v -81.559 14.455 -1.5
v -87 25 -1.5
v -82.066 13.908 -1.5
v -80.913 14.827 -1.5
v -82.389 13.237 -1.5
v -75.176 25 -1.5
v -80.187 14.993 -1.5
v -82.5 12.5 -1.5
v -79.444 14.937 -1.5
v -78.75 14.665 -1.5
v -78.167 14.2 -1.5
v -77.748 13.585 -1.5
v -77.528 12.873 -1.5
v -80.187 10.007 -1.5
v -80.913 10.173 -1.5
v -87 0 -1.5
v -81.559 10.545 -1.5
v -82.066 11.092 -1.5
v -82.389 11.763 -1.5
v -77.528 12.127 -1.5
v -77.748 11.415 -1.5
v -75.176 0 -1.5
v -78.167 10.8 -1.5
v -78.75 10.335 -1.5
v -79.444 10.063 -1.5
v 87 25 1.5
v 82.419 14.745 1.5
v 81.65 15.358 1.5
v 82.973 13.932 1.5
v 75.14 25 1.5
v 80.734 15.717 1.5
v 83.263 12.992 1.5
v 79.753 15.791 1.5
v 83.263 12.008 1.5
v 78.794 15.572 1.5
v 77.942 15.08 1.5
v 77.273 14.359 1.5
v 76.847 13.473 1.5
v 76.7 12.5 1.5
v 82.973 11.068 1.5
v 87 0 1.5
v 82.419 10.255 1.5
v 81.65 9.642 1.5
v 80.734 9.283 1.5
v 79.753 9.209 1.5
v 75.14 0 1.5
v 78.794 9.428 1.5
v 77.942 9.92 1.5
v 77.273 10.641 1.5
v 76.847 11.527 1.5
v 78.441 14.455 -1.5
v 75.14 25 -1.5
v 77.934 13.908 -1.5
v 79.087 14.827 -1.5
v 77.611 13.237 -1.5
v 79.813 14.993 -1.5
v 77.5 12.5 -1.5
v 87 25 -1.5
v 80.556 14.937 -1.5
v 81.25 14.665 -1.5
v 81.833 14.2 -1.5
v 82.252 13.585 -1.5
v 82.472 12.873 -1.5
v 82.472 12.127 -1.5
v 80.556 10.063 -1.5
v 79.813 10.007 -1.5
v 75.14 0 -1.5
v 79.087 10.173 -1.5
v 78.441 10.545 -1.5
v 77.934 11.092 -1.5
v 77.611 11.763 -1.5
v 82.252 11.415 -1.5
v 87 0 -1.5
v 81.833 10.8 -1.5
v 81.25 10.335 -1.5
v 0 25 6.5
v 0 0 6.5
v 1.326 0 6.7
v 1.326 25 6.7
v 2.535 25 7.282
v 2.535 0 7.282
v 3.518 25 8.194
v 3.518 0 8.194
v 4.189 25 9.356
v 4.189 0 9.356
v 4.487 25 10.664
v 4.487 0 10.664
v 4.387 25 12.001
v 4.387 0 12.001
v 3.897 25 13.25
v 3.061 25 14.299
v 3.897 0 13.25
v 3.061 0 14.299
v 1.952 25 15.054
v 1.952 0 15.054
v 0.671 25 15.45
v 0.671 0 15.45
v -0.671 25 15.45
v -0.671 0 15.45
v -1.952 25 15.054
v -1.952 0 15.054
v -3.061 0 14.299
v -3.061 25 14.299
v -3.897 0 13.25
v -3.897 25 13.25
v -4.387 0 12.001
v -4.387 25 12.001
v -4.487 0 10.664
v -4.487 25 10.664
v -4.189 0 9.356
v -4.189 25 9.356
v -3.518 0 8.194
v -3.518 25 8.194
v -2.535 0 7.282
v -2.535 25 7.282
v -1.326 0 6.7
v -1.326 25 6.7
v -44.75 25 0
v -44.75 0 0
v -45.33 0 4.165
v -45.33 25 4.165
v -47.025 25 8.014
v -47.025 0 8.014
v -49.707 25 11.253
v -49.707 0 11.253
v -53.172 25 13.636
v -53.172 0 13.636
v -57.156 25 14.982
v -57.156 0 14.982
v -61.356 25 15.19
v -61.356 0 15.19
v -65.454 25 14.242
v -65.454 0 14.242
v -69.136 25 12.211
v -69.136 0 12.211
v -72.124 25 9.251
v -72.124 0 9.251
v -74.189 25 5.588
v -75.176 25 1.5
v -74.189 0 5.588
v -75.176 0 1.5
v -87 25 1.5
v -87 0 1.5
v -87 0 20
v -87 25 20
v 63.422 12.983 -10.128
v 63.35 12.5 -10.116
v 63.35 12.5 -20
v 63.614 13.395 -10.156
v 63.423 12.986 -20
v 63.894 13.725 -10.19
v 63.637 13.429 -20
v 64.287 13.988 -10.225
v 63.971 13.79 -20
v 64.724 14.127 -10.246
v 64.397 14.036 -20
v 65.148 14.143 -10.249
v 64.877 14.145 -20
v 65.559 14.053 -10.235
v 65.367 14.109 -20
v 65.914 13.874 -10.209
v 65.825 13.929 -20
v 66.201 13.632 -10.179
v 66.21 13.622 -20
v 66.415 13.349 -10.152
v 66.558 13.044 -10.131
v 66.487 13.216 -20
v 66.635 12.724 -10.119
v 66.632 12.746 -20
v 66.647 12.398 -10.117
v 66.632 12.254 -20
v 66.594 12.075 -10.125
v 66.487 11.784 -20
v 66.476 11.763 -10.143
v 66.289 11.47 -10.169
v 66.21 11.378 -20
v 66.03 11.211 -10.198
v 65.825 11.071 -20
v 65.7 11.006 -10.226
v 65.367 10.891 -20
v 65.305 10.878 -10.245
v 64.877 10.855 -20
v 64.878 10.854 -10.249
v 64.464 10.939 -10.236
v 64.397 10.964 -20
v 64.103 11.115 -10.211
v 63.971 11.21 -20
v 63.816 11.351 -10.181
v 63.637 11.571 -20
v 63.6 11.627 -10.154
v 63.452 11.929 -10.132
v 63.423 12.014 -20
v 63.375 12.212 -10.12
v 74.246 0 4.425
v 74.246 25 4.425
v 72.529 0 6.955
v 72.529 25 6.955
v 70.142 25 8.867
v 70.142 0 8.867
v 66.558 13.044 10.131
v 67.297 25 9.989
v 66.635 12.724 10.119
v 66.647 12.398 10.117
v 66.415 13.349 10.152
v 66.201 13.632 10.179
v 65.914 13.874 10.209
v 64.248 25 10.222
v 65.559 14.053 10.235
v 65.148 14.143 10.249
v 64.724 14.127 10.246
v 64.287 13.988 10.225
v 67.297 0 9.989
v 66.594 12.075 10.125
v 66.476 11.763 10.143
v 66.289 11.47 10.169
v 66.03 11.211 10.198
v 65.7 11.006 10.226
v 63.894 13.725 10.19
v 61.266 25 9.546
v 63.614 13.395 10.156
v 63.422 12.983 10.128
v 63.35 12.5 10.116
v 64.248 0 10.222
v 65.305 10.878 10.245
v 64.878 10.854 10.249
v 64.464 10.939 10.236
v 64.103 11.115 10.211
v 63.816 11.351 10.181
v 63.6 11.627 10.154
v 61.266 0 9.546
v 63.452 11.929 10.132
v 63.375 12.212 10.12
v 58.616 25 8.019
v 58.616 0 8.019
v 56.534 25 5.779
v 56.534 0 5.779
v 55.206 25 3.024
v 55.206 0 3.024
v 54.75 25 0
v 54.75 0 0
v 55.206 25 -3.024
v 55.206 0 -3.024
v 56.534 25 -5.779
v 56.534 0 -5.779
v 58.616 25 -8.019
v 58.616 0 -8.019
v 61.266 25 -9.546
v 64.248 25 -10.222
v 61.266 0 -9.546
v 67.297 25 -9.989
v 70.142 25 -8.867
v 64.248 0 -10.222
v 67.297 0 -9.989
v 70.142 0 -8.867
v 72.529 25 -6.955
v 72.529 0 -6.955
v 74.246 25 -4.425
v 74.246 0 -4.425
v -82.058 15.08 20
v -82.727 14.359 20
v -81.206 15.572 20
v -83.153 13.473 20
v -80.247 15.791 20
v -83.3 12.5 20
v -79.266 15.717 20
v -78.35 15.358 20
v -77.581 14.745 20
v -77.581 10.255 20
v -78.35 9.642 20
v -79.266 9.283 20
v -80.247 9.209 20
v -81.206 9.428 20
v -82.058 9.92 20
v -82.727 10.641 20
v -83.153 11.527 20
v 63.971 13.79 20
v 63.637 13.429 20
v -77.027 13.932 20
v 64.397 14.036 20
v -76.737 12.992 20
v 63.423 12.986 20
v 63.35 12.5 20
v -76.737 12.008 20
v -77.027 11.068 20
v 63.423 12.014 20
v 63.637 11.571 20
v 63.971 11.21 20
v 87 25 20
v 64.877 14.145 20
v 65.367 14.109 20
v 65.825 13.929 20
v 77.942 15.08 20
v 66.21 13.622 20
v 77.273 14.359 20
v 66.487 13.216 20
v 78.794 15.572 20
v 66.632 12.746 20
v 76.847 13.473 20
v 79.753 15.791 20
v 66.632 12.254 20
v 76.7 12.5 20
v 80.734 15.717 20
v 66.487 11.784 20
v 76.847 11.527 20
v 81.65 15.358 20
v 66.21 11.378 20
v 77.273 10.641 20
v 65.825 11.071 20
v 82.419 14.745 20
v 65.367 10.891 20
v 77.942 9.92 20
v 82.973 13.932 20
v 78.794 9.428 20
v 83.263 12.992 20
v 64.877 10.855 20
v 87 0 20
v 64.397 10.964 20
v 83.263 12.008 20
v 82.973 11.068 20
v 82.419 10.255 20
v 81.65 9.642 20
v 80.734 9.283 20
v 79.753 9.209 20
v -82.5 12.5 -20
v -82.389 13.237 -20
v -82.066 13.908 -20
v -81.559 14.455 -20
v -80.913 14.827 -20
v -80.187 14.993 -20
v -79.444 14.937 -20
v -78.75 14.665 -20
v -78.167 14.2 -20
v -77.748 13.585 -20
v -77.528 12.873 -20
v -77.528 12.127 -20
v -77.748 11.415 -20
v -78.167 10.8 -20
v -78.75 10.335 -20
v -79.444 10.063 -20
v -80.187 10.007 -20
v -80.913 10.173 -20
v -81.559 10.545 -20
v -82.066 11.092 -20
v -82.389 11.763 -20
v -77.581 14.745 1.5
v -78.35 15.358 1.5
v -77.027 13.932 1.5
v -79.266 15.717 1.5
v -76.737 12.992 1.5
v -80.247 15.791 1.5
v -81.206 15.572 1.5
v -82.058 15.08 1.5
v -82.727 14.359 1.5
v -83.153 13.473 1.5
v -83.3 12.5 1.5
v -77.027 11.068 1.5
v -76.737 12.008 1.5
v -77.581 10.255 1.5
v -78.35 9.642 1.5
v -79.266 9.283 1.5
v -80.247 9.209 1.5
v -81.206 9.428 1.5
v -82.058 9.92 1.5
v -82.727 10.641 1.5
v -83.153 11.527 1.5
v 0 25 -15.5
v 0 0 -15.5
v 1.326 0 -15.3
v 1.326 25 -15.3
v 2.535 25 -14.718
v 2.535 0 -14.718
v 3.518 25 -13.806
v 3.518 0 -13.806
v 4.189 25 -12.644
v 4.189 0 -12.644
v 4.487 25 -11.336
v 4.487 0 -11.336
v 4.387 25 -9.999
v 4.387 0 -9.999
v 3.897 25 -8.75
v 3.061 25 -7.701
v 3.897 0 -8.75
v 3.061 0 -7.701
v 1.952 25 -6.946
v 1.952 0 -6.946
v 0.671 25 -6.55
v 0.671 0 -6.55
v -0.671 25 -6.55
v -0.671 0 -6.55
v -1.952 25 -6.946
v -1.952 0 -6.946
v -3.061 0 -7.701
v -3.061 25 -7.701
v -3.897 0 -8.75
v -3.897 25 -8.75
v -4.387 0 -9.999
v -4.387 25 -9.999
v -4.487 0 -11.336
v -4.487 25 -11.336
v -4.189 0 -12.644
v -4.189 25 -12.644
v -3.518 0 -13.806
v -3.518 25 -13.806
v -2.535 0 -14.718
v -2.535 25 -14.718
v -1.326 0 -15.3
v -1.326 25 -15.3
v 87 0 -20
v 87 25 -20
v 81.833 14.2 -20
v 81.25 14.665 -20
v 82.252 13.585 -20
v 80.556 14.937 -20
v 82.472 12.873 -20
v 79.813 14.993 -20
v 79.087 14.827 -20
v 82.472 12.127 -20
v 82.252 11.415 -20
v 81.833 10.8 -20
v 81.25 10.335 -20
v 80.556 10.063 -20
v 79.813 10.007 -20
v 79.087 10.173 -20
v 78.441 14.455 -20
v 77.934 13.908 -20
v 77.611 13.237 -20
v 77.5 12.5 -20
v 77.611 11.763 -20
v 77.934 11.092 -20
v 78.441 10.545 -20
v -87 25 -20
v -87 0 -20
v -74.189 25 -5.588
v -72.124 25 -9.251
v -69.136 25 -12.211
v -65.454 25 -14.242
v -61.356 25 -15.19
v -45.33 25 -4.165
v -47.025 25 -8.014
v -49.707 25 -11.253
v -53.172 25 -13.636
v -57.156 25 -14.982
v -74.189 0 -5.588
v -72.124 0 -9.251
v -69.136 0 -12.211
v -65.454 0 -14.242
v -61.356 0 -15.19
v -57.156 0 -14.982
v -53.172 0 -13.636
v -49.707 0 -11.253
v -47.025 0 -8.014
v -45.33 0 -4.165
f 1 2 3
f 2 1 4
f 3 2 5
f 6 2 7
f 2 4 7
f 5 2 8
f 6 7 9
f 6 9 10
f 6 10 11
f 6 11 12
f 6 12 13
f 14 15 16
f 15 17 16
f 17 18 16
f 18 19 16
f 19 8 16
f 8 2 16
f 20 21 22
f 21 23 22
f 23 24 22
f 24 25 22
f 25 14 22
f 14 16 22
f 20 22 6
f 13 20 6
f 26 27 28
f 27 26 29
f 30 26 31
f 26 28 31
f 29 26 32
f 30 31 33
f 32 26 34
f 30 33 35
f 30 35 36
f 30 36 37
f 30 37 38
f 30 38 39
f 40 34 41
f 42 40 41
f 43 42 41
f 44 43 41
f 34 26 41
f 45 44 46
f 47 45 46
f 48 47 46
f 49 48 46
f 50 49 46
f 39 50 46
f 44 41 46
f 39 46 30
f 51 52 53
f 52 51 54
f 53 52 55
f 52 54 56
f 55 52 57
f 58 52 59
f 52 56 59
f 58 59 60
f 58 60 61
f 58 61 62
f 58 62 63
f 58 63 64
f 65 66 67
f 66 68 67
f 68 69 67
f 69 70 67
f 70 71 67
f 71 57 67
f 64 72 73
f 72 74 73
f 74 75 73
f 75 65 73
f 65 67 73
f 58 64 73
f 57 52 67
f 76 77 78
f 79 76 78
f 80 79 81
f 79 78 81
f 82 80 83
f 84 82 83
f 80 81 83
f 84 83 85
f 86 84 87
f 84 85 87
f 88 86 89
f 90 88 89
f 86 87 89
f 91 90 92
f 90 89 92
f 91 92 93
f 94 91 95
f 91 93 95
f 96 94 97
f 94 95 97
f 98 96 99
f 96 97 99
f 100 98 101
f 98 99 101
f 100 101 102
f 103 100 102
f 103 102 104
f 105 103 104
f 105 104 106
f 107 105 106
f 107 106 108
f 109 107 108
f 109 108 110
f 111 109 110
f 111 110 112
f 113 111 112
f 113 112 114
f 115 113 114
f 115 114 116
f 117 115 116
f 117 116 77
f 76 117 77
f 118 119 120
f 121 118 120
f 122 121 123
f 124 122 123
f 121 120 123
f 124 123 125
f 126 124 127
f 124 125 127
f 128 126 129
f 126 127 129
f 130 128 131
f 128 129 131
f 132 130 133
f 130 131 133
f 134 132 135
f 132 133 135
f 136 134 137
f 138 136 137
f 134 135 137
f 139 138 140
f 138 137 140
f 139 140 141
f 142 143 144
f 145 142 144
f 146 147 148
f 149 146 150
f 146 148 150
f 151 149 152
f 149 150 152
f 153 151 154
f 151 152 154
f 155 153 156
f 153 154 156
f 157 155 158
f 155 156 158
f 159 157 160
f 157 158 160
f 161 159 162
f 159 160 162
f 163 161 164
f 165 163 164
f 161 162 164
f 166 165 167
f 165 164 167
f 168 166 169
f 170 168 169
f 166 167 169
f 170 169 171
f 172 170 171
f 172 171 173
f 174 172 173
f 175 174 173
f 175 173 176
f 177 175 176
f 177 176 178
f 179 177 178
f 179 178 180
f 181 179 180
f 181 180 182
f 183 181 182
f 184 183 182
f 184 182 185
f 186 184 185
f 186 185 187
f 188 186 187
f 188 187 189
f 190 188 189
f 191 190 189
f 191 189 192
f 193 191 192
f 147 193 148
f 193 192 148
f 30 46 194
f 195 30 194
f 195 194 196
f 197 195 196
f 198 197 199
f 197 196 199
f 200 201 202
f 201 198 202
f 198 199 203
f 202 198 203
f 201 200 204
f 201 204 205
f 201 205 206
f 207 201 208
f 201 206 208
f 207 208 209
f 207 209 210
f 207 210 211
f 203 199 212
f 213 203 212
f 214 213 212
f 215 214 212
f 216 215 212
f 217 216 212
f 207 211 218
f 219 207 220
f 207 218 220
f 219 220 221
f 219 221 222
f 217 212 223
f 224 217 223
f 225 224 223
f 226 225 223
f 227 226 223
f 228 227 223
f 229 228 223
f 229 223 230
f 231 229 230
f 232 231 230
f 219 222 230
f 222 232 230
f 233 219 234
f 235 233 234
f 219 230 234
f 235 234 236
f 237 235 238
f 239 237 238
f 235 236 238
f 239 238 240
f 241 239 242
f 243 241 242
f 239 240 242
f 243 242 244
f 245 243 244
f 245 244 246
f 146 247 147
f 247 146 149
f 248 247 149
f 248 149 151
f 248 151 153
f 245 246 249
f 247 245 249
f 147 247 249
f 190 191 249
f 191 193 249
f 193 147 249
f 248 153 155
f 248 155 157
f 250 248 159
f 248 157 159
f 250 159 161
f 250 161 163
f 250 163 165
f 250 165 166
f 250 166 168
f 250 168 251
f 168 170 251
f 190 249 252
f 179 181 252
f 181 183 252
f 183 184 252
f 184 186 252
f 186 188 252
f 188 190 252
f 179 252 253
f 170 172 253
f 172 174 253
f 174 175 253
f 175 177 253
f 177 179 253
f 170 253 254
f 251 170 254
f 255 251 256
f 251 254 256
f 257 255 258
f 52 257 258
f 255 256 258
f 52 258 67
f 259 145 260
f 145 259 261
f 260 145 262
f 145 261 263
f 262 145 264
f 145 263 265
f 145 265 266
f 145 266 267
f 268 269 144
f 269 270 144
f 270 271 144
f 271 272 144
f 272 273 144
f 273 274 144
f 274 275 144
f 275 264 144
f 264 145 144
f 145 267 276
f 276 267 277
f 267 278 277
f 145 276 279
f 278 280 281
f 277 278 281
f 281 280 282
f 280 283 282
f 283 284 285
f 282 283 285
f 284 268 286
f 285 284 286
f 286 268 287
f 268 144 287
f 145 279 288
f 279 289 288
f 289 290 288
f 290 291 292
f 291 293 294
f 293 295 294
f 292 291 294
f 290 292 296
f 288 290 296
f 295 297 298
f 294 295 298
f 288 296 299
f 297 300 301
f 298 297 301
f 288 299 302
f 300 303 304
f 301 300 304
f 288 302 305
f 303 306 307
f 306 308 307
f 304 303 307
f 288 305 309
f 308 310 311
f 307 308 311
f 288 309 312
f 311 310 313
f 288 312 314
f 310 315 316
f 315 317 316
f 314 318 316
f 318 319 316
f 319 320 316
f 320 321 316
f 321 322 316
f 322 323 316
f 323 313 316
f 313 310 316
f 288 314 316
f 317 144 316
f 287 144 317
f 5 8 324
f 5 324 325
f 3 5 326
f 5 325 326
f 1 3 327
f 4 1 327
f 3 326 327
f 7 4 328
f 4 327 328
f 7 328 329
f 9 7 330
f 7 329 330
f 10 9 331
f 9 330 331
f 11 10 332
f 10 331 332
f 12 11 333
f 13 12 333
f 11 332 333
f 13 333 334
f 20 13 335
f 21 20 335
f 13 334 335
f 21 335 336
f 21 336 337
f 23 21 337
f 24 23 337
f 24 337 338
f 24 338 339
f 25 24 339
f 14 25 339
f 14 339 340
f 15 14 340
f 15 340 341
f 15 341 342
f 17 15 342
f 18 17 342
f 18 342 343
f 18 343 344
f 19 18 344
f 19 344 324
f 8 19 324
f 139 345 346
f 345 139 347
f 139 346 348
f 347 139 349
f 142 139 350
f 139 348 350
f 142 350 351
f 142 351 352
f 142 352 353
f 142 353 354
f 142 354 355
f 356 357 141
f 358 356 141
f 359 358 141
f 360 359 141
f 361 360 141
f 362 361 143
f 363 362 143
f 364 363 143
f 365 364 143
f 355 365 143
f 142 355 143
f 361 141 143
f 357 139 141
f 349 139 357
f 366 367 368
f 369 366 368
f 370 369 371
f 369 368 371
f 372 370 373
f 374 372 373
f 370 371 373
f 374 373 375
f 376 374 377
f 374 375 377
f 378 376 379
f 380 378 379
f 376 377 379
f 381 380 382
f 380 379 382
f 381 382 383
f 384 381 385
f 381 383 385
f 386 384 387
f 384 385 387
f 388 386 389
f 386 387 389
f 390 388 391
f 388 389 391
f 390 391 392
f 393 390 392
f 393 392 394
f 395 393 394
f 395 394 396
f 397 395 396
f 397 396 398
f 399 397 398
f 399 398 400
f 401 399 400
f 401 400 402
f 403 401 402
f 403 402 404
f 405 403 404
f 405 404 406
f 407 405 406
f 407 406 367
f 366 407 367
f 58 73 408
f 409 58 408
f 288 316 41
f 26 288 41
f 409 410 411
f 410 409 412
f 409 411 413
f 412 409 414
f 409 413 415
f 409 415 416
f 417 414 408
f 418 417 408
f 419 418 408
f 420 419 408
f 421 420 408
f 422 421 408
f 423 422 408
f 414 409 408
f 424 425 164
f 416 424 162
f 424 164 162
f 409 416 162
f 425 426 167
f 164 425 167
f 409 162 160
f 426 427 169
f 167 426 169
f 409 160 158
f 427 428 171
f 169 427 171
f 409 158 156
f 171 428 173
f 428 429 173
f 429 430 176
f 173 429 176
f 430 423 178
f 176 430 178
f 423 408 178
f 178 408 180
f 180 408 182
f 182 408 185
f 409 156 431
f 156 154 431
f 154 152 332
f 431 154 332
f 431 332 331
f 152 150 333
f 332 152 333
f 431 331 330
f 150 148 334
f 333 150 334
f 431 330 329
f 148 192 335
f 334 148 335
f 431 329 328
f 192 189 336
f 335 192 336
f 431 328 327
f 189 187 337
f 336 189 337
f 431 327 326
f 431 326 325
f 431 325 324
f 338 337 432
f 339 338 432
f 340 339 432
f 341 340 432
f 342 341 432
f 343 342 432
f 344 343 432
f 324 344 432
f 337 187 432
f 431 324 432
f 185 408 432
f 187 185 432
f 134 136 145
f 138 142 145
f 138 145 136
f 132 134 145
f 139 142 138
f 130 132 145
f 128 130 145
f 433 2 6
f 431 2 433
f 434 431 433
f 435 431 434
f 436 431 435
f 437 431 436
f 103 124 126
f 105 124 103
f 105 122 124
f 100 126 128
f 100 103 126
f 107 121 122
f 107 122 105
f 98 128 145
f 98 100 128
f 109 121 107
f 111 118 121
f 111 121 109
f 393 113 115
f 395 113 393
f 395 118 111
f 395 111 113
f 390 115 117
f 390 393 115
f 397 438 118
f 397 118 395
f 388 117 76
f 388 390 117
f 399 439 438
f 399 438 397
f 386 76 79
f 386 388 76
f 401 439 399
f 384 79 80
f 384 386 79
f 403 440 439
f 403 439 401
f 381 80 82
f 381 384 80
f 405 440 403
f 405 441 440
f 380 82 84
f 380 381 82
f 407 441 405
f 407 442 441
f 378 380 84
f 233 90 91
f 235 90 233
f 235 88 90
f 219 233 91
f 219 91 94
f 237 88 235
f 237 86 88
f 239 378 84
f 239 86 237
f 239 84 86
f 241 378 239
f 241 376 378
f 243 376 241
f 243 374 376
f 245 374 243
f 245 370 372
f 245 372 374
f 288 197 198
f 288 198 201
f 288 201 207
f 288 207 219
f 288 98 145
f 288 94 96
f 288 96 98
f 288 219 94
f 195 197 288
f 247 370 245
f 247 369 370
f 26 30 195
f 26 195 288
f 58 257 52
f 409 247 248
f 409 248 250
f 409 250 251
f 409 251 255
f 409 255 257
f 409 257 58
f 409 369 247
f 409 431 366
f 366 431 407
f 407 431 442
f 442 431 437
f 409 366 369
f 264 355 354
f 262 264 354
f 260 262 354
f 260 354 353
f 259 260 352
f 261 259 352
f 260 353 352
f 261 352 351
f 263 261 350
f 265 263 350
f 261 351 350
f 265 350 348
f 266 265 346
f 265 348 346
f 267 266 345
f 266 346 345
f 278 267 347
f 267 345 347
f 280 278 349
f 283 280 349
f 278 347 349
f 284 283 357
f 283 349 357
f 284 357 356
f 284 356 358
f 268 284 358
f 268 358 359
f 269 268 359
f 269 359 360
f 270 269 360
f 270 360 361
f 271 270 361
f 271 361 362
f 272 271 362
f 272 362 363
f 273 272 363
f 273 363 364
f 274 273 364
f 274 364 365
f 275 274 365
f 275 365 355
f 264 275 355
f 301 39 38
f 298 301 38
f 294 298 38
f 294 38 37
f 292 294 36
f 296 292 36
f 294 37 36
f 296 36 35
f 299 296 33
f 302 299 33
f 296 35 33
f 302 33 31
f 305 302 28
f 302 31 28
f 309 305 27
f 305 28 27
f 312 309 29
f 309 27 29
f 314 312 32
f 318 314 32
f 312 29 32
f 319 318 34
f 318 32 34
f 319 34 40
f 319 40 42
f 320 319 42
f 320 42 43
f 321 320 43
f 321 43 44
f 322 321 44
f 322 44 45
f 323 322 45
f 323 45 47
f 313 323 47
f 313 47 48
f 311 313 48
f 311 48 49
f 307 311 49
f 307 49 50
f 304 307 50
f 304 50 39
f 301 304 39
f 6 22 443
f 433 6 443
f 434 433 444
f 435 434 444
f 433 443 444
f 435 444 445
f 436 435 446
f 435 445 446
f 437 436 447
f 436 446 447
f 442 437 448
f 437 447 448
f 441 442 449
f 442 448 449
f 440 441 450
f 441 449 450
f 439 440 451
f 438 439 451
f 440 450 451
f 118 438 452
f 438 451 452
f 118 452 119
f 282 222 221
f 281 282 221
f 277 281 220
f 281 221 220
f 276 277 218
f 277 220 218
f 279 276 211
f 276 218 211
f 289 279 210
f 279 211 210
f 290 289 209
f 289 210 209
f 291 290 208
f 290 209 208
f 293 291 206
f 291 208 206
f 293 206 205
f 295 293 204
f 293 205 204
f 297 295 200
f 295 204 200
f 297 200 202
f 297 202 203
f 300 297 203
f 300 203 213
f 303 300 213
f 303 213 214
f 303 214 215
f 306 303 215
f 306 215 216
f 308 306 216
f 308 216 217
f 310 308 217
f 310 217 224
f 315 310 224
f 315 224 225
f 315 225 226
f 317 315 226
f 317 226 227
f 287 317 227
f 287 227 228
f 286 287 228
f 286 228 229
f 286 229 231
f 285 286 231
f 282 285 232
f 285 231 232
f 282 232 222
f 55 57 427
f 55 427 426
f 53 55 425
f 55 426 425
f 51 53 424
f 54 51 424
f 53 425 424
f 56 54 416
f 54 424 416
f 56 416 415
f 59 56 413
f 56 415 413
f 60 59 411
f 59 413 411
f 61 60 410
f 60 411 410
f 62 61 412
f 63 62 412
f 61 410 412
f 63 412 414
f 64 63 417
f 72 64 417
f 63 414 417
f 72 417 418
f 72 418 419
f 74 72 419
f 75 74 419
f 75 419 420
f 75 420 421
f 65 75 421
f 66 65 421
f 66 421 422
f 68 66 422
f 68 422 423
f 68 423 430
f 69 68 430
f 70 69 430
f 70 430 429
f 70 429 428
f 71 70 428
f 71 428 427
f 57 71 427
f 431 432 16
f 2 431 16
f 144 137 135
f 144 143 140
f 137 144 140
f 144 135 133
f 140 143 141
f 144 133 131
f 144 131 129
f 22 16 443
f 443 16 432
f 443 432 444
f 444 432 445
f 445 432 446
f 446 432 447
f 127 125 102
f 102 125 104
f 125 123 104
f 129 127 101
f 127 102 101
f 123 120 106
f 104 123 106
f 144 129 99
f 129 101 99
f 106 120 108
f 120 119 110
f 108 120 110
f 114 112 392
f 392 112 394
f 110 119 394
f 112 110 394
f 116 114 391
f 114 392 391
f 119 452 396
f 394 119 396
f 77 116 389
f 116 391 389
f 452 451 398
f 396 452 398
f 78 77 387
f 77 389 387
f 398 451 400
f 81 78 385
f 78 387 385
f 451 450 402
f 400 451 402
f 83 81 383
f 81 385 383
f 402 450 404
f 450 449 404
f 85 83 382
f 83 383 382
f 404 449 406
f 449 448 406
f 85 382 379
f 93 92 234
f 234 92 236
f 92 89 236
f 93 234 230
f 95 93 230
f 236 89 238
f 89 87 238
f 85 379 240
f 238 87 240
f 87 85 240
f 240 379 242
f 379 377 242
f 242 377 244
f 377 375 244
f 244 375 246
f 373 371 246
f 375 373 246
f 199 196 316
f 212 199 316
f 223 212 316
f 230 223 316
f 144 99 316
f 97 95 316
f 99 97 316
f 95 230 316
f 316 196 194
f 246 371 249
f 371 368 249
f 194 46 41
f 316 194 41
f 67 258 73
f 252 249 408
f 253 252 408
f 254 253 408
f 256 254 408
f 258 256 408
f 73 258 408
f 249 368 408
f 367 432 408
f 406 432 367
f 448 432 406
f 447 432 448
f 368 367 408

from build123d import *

# Parameters (mm, degrees)
BOSS_EXTRU_1_DEPTH   = 25
D_GAGEMENT_M61_D     = 6.6
D_GAGEMENT_M61_DEPTH = 18.5
TROU_TARAUD_M61_D    = 5
TROU_TARAUD_M41_D    = 3.3
D_GAGEMENT_M81_D     = 9


with BuildPart() as part:
    # Esquisse1 → Boss.-Extru.1 (new body)
    with BuildSketch(Plane(origin=(0, 0, 0), x_dir=(1, 0, 0), z_dir=(0, 1, 0))):
        with BuildLine():
            Line((-87, -1.5), (-87, -20))
            Line((-87, -20), (87, -20))
            Line((87, -20), (87, -1.5))
            Line((87, -1.5), (75.139649895, -1.5))
            ThreePointArc((75.139649895, -1.5), (54.75, 0), (75.139649895, 1.5))
            Line((75.139649895, 1.5), (87, 1.5))
            Line((87, 1.5), (87, 20))
            Line((87, 20), (-87, 20))
            Line((-87, 20), (-87, 1.5))
            Line((-87, 1.5), (-75.176050211, 1.5))
            ThreePointArc((-75.176050211, 1.5), (-59.249089125, 15.231501333), (-44.75, 0))
            ThreePointArc((-44.75, 0), (-59.249089125, -15.231501333), (-75.176050211, -1.5))
            Line((-75.176050211, -1.5), (-87, -1.5))
        make_face()
    extrude(amount=BOSS_EXTRU_1_DEPTH)

    # Dégagement M61
    with Locations(Plane(origin=(80, 12.5, 20), x_dir=(1, 0, 0), z_dir=(0, 0, 1))):
        with Locations((0, 0), (-160, 0)):
            Hole(D_GAGEMENT_M61_D / 2, depth=D_GAGEMENT_M61_DEPTH)

    # Trou taraudé M61 (through all)
    with Locations(Plane(origin=(80, 12.5, -1.5), x_dir=(1, 0, 0), z_dir=(0, 0, 1))):
        with Locations((0, 0), (-160, 0)):
            Hole(TROU_TARAUD_M61_D / 2)

    # Trou taraudé M41 (through all)
    with Locations(Plane(origin=(65, 12.5, 20), x_dir=(1, 0, 0), z_dir=(0, 0, 1))):
        with Locations((0, 0)):
            Hole(TROU_TARAUD_M41_D / 2)

    # Dégagement M81 (through all)
    with Locations(Plane(origin=(0, 25, -11), x_dir=(0, 0, 1), z_dir=(0, 1, 0))):
        with Locations((0, 0), (22, 0)):
            Hole(D_GAGEMENT_M81_D / 2)


solid = part.part
